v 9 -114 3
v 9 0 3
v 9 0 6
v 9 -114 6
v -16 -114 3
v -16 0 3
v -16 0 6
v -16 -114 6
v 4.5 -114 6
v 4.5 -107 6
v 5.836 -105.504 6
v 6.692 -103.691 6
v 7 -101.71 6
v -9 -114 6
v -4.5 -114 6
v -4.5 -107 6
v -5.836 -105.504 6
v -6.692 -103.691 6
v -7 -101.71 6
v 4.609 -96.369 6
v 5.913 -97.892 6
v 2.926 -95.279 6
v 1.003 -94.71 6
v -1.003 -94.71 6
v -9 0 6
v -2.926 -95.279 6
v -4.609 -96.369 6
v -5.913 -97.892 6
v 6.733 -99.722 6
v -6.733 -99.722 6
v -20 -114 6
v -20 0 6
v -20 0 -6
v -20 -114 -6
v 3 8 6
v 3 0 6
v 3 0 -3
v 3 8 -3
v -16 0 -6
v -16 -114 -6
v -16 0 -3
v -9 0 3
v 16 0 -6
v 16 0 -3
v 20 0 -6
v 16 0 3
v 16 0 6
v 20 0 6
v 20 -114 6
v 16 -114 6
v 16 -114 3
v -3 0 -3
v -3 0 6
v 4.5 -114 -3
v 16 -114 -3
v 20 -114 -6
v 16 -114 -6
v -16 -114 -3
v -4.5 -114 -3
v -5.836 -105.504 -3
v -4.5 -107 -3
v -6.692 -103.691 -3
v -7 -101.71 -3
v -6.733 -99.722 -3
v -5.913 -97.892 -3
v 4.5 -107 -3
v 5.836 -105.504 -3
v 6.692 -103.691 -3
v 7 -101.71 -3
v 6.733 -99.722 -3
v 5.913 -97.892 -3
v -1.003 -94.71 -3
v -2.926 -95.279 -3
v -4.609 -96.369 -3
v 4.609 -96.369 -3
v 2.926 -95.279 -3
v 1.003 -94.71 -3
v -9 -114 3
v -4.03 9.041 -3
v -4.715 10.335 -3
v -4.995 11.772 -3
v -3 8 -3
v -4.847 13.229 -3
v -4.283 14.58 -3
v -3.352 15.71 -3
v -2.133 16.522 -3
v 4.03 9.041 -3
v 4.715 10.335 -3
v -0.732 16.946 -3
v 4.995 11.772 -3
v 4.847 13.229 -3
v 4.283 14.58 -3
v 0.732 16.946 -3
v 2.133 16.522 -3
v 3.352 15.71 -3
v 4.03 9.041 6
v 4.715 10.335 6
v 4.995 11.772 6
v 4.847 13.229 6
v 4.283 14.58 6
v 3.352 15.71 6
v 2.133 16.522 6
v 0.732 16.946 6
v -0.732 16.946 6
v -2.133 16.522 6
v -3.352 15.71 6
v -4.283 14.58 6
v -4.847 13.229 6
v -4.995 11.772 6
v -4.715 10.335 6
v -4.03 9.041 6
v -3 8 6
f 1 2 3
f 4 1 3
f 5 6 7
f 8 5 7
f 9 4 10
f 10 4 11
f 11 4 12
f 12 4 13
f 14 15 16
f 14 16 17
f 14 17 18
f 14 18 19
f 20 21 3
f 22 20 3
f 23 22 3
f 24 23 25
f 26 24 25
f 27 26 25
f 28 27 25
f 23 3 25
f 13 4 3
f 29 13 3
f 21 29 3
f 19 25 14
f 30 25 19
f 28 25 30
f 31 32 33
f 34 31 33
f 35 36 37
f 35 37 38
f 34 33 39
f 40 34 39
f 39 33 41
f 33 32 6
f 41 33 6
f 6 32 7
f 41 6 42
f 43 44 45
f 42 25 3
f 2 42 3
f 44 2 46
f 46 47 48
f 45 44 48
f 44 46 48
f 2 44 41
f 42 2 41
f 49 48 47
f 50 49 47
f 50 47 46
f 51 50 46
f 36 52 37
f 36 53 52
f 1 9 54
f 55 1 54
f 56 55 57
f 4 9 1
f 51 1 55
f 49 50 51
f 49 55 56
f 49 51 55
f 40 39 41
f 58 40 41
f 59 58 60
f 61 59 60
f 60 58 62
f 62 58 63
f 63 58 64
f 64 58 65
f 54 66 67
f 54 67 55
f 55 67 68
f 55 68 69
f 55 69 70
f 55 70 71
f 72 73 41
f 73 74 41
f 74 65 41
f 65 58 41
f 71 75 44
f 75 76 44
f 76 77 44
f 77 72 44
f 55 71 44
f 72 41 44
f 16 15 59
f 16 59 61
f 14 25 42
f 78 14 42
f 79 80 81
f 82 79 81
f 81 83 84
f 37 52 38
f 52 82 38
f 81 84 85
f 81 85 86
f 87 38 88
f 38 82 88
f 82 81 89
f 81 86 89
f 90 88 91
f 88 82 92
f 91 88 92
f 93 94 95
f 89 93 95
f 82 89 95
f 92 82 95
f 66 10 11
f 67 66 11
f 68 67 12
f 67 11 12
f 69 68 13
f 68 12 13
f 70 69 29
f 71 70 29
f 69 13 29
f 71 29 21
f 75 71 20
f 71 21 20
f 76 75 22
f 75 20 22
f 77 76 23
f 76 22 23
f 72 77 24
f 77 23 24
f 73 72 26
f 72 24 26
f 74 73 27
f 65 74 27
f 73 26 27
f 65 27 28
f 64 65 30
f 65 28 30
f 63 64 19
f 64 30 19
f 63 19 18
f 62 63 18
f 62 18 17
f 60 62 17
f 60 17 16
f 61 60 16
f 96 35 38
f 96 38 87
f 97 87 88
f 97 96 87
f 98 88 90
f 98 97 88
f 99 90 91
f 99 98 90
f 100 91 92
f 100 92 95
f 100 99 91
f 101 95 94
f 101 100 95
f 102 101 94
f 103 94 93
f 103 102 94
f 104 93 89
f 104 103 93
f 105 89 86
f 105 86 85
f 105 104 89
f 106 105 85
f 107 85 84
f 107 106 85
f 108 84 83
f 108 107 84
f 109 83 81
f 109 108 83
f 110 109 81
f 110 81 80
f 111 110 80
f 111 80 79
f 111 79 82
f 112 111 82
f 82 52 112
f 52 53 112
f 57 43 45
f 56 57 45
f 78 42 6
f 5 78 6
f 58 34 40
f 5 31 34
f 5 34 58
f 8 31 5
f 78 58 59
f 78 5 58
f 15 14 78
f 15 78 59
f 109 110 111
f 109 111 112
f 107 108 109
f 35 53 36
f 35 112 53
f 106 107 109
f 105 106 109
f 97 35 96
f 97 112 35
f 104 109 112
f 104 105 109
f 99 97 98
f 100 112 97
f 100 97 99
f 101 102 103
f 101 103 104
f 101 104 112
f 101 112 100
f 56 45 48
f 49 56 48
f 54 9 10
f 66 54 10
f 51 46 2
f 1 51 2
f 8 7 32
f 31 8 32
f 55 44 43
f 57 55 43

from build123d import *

# Parameters (mm, degrees)
PAD_DEPTH         = 114
POCKET_DEPTH      = 12.001
PAD001_DEPTH      = 6
PAD001_DEPTH_BACK = 3


with BuildPart() as body:
    # Sketch → Pad (new body)
    with BuildSketch(Plane.XZ):
        Polygon((-20, 6), (-20, -6), (-16, -6), (-16, -3), (-9, -3), (9, -3), (16, -3), (16, -6), (20, -6), (20, 6), (16, 6), (16, 3), (9, 3), (9, 6), (-9, 6), (-9, 3), (-16, 3), (-16, 6), align=None)
    extrude(amount=PAD_DEPTH)

    # Sketch002 (on Face14 of Pad) → Pocket (cut, through all)
    with BuildSketch(Plane(origin=(0, 0, 6), x_dir=(-1, 0, 0), z_dir=(0, 0, 1))):
        with BuildLine():
            Line((-4.5, 114), (4.5, 114))
            Line((4.5, 114), (4.5, 107))
            ThreePointArc((-4.5, 107), (0, 94.638097), (4.5, 107))
            Line((-4.5, 114), (-4.5, 107))
        make_face()
    extrude(amount=-POCKET_DEPTH, mode=Mode.SUBTRACT)


with BuildPart() as body001:
    # Sketch001 → Pad001 (new body, two sides)
    with BuildSketch(Plane.XY) as pad001_sk:
        with BuildLine():
            Line((-3, 0), (3, 0))
            Line((3, 0), (3, 8))
            ThreePointArc((3, 8), (0, 17), (-3, 8))
            Line((-3, 0), (-3, 8))
        make_face()
    extrude(amount=PAD001_DEPTH)
    extrude(pad001_sk.sketch, amount=-PAD001_DEPTH_BACK)


solid = Compound([body.part, body001.part])
